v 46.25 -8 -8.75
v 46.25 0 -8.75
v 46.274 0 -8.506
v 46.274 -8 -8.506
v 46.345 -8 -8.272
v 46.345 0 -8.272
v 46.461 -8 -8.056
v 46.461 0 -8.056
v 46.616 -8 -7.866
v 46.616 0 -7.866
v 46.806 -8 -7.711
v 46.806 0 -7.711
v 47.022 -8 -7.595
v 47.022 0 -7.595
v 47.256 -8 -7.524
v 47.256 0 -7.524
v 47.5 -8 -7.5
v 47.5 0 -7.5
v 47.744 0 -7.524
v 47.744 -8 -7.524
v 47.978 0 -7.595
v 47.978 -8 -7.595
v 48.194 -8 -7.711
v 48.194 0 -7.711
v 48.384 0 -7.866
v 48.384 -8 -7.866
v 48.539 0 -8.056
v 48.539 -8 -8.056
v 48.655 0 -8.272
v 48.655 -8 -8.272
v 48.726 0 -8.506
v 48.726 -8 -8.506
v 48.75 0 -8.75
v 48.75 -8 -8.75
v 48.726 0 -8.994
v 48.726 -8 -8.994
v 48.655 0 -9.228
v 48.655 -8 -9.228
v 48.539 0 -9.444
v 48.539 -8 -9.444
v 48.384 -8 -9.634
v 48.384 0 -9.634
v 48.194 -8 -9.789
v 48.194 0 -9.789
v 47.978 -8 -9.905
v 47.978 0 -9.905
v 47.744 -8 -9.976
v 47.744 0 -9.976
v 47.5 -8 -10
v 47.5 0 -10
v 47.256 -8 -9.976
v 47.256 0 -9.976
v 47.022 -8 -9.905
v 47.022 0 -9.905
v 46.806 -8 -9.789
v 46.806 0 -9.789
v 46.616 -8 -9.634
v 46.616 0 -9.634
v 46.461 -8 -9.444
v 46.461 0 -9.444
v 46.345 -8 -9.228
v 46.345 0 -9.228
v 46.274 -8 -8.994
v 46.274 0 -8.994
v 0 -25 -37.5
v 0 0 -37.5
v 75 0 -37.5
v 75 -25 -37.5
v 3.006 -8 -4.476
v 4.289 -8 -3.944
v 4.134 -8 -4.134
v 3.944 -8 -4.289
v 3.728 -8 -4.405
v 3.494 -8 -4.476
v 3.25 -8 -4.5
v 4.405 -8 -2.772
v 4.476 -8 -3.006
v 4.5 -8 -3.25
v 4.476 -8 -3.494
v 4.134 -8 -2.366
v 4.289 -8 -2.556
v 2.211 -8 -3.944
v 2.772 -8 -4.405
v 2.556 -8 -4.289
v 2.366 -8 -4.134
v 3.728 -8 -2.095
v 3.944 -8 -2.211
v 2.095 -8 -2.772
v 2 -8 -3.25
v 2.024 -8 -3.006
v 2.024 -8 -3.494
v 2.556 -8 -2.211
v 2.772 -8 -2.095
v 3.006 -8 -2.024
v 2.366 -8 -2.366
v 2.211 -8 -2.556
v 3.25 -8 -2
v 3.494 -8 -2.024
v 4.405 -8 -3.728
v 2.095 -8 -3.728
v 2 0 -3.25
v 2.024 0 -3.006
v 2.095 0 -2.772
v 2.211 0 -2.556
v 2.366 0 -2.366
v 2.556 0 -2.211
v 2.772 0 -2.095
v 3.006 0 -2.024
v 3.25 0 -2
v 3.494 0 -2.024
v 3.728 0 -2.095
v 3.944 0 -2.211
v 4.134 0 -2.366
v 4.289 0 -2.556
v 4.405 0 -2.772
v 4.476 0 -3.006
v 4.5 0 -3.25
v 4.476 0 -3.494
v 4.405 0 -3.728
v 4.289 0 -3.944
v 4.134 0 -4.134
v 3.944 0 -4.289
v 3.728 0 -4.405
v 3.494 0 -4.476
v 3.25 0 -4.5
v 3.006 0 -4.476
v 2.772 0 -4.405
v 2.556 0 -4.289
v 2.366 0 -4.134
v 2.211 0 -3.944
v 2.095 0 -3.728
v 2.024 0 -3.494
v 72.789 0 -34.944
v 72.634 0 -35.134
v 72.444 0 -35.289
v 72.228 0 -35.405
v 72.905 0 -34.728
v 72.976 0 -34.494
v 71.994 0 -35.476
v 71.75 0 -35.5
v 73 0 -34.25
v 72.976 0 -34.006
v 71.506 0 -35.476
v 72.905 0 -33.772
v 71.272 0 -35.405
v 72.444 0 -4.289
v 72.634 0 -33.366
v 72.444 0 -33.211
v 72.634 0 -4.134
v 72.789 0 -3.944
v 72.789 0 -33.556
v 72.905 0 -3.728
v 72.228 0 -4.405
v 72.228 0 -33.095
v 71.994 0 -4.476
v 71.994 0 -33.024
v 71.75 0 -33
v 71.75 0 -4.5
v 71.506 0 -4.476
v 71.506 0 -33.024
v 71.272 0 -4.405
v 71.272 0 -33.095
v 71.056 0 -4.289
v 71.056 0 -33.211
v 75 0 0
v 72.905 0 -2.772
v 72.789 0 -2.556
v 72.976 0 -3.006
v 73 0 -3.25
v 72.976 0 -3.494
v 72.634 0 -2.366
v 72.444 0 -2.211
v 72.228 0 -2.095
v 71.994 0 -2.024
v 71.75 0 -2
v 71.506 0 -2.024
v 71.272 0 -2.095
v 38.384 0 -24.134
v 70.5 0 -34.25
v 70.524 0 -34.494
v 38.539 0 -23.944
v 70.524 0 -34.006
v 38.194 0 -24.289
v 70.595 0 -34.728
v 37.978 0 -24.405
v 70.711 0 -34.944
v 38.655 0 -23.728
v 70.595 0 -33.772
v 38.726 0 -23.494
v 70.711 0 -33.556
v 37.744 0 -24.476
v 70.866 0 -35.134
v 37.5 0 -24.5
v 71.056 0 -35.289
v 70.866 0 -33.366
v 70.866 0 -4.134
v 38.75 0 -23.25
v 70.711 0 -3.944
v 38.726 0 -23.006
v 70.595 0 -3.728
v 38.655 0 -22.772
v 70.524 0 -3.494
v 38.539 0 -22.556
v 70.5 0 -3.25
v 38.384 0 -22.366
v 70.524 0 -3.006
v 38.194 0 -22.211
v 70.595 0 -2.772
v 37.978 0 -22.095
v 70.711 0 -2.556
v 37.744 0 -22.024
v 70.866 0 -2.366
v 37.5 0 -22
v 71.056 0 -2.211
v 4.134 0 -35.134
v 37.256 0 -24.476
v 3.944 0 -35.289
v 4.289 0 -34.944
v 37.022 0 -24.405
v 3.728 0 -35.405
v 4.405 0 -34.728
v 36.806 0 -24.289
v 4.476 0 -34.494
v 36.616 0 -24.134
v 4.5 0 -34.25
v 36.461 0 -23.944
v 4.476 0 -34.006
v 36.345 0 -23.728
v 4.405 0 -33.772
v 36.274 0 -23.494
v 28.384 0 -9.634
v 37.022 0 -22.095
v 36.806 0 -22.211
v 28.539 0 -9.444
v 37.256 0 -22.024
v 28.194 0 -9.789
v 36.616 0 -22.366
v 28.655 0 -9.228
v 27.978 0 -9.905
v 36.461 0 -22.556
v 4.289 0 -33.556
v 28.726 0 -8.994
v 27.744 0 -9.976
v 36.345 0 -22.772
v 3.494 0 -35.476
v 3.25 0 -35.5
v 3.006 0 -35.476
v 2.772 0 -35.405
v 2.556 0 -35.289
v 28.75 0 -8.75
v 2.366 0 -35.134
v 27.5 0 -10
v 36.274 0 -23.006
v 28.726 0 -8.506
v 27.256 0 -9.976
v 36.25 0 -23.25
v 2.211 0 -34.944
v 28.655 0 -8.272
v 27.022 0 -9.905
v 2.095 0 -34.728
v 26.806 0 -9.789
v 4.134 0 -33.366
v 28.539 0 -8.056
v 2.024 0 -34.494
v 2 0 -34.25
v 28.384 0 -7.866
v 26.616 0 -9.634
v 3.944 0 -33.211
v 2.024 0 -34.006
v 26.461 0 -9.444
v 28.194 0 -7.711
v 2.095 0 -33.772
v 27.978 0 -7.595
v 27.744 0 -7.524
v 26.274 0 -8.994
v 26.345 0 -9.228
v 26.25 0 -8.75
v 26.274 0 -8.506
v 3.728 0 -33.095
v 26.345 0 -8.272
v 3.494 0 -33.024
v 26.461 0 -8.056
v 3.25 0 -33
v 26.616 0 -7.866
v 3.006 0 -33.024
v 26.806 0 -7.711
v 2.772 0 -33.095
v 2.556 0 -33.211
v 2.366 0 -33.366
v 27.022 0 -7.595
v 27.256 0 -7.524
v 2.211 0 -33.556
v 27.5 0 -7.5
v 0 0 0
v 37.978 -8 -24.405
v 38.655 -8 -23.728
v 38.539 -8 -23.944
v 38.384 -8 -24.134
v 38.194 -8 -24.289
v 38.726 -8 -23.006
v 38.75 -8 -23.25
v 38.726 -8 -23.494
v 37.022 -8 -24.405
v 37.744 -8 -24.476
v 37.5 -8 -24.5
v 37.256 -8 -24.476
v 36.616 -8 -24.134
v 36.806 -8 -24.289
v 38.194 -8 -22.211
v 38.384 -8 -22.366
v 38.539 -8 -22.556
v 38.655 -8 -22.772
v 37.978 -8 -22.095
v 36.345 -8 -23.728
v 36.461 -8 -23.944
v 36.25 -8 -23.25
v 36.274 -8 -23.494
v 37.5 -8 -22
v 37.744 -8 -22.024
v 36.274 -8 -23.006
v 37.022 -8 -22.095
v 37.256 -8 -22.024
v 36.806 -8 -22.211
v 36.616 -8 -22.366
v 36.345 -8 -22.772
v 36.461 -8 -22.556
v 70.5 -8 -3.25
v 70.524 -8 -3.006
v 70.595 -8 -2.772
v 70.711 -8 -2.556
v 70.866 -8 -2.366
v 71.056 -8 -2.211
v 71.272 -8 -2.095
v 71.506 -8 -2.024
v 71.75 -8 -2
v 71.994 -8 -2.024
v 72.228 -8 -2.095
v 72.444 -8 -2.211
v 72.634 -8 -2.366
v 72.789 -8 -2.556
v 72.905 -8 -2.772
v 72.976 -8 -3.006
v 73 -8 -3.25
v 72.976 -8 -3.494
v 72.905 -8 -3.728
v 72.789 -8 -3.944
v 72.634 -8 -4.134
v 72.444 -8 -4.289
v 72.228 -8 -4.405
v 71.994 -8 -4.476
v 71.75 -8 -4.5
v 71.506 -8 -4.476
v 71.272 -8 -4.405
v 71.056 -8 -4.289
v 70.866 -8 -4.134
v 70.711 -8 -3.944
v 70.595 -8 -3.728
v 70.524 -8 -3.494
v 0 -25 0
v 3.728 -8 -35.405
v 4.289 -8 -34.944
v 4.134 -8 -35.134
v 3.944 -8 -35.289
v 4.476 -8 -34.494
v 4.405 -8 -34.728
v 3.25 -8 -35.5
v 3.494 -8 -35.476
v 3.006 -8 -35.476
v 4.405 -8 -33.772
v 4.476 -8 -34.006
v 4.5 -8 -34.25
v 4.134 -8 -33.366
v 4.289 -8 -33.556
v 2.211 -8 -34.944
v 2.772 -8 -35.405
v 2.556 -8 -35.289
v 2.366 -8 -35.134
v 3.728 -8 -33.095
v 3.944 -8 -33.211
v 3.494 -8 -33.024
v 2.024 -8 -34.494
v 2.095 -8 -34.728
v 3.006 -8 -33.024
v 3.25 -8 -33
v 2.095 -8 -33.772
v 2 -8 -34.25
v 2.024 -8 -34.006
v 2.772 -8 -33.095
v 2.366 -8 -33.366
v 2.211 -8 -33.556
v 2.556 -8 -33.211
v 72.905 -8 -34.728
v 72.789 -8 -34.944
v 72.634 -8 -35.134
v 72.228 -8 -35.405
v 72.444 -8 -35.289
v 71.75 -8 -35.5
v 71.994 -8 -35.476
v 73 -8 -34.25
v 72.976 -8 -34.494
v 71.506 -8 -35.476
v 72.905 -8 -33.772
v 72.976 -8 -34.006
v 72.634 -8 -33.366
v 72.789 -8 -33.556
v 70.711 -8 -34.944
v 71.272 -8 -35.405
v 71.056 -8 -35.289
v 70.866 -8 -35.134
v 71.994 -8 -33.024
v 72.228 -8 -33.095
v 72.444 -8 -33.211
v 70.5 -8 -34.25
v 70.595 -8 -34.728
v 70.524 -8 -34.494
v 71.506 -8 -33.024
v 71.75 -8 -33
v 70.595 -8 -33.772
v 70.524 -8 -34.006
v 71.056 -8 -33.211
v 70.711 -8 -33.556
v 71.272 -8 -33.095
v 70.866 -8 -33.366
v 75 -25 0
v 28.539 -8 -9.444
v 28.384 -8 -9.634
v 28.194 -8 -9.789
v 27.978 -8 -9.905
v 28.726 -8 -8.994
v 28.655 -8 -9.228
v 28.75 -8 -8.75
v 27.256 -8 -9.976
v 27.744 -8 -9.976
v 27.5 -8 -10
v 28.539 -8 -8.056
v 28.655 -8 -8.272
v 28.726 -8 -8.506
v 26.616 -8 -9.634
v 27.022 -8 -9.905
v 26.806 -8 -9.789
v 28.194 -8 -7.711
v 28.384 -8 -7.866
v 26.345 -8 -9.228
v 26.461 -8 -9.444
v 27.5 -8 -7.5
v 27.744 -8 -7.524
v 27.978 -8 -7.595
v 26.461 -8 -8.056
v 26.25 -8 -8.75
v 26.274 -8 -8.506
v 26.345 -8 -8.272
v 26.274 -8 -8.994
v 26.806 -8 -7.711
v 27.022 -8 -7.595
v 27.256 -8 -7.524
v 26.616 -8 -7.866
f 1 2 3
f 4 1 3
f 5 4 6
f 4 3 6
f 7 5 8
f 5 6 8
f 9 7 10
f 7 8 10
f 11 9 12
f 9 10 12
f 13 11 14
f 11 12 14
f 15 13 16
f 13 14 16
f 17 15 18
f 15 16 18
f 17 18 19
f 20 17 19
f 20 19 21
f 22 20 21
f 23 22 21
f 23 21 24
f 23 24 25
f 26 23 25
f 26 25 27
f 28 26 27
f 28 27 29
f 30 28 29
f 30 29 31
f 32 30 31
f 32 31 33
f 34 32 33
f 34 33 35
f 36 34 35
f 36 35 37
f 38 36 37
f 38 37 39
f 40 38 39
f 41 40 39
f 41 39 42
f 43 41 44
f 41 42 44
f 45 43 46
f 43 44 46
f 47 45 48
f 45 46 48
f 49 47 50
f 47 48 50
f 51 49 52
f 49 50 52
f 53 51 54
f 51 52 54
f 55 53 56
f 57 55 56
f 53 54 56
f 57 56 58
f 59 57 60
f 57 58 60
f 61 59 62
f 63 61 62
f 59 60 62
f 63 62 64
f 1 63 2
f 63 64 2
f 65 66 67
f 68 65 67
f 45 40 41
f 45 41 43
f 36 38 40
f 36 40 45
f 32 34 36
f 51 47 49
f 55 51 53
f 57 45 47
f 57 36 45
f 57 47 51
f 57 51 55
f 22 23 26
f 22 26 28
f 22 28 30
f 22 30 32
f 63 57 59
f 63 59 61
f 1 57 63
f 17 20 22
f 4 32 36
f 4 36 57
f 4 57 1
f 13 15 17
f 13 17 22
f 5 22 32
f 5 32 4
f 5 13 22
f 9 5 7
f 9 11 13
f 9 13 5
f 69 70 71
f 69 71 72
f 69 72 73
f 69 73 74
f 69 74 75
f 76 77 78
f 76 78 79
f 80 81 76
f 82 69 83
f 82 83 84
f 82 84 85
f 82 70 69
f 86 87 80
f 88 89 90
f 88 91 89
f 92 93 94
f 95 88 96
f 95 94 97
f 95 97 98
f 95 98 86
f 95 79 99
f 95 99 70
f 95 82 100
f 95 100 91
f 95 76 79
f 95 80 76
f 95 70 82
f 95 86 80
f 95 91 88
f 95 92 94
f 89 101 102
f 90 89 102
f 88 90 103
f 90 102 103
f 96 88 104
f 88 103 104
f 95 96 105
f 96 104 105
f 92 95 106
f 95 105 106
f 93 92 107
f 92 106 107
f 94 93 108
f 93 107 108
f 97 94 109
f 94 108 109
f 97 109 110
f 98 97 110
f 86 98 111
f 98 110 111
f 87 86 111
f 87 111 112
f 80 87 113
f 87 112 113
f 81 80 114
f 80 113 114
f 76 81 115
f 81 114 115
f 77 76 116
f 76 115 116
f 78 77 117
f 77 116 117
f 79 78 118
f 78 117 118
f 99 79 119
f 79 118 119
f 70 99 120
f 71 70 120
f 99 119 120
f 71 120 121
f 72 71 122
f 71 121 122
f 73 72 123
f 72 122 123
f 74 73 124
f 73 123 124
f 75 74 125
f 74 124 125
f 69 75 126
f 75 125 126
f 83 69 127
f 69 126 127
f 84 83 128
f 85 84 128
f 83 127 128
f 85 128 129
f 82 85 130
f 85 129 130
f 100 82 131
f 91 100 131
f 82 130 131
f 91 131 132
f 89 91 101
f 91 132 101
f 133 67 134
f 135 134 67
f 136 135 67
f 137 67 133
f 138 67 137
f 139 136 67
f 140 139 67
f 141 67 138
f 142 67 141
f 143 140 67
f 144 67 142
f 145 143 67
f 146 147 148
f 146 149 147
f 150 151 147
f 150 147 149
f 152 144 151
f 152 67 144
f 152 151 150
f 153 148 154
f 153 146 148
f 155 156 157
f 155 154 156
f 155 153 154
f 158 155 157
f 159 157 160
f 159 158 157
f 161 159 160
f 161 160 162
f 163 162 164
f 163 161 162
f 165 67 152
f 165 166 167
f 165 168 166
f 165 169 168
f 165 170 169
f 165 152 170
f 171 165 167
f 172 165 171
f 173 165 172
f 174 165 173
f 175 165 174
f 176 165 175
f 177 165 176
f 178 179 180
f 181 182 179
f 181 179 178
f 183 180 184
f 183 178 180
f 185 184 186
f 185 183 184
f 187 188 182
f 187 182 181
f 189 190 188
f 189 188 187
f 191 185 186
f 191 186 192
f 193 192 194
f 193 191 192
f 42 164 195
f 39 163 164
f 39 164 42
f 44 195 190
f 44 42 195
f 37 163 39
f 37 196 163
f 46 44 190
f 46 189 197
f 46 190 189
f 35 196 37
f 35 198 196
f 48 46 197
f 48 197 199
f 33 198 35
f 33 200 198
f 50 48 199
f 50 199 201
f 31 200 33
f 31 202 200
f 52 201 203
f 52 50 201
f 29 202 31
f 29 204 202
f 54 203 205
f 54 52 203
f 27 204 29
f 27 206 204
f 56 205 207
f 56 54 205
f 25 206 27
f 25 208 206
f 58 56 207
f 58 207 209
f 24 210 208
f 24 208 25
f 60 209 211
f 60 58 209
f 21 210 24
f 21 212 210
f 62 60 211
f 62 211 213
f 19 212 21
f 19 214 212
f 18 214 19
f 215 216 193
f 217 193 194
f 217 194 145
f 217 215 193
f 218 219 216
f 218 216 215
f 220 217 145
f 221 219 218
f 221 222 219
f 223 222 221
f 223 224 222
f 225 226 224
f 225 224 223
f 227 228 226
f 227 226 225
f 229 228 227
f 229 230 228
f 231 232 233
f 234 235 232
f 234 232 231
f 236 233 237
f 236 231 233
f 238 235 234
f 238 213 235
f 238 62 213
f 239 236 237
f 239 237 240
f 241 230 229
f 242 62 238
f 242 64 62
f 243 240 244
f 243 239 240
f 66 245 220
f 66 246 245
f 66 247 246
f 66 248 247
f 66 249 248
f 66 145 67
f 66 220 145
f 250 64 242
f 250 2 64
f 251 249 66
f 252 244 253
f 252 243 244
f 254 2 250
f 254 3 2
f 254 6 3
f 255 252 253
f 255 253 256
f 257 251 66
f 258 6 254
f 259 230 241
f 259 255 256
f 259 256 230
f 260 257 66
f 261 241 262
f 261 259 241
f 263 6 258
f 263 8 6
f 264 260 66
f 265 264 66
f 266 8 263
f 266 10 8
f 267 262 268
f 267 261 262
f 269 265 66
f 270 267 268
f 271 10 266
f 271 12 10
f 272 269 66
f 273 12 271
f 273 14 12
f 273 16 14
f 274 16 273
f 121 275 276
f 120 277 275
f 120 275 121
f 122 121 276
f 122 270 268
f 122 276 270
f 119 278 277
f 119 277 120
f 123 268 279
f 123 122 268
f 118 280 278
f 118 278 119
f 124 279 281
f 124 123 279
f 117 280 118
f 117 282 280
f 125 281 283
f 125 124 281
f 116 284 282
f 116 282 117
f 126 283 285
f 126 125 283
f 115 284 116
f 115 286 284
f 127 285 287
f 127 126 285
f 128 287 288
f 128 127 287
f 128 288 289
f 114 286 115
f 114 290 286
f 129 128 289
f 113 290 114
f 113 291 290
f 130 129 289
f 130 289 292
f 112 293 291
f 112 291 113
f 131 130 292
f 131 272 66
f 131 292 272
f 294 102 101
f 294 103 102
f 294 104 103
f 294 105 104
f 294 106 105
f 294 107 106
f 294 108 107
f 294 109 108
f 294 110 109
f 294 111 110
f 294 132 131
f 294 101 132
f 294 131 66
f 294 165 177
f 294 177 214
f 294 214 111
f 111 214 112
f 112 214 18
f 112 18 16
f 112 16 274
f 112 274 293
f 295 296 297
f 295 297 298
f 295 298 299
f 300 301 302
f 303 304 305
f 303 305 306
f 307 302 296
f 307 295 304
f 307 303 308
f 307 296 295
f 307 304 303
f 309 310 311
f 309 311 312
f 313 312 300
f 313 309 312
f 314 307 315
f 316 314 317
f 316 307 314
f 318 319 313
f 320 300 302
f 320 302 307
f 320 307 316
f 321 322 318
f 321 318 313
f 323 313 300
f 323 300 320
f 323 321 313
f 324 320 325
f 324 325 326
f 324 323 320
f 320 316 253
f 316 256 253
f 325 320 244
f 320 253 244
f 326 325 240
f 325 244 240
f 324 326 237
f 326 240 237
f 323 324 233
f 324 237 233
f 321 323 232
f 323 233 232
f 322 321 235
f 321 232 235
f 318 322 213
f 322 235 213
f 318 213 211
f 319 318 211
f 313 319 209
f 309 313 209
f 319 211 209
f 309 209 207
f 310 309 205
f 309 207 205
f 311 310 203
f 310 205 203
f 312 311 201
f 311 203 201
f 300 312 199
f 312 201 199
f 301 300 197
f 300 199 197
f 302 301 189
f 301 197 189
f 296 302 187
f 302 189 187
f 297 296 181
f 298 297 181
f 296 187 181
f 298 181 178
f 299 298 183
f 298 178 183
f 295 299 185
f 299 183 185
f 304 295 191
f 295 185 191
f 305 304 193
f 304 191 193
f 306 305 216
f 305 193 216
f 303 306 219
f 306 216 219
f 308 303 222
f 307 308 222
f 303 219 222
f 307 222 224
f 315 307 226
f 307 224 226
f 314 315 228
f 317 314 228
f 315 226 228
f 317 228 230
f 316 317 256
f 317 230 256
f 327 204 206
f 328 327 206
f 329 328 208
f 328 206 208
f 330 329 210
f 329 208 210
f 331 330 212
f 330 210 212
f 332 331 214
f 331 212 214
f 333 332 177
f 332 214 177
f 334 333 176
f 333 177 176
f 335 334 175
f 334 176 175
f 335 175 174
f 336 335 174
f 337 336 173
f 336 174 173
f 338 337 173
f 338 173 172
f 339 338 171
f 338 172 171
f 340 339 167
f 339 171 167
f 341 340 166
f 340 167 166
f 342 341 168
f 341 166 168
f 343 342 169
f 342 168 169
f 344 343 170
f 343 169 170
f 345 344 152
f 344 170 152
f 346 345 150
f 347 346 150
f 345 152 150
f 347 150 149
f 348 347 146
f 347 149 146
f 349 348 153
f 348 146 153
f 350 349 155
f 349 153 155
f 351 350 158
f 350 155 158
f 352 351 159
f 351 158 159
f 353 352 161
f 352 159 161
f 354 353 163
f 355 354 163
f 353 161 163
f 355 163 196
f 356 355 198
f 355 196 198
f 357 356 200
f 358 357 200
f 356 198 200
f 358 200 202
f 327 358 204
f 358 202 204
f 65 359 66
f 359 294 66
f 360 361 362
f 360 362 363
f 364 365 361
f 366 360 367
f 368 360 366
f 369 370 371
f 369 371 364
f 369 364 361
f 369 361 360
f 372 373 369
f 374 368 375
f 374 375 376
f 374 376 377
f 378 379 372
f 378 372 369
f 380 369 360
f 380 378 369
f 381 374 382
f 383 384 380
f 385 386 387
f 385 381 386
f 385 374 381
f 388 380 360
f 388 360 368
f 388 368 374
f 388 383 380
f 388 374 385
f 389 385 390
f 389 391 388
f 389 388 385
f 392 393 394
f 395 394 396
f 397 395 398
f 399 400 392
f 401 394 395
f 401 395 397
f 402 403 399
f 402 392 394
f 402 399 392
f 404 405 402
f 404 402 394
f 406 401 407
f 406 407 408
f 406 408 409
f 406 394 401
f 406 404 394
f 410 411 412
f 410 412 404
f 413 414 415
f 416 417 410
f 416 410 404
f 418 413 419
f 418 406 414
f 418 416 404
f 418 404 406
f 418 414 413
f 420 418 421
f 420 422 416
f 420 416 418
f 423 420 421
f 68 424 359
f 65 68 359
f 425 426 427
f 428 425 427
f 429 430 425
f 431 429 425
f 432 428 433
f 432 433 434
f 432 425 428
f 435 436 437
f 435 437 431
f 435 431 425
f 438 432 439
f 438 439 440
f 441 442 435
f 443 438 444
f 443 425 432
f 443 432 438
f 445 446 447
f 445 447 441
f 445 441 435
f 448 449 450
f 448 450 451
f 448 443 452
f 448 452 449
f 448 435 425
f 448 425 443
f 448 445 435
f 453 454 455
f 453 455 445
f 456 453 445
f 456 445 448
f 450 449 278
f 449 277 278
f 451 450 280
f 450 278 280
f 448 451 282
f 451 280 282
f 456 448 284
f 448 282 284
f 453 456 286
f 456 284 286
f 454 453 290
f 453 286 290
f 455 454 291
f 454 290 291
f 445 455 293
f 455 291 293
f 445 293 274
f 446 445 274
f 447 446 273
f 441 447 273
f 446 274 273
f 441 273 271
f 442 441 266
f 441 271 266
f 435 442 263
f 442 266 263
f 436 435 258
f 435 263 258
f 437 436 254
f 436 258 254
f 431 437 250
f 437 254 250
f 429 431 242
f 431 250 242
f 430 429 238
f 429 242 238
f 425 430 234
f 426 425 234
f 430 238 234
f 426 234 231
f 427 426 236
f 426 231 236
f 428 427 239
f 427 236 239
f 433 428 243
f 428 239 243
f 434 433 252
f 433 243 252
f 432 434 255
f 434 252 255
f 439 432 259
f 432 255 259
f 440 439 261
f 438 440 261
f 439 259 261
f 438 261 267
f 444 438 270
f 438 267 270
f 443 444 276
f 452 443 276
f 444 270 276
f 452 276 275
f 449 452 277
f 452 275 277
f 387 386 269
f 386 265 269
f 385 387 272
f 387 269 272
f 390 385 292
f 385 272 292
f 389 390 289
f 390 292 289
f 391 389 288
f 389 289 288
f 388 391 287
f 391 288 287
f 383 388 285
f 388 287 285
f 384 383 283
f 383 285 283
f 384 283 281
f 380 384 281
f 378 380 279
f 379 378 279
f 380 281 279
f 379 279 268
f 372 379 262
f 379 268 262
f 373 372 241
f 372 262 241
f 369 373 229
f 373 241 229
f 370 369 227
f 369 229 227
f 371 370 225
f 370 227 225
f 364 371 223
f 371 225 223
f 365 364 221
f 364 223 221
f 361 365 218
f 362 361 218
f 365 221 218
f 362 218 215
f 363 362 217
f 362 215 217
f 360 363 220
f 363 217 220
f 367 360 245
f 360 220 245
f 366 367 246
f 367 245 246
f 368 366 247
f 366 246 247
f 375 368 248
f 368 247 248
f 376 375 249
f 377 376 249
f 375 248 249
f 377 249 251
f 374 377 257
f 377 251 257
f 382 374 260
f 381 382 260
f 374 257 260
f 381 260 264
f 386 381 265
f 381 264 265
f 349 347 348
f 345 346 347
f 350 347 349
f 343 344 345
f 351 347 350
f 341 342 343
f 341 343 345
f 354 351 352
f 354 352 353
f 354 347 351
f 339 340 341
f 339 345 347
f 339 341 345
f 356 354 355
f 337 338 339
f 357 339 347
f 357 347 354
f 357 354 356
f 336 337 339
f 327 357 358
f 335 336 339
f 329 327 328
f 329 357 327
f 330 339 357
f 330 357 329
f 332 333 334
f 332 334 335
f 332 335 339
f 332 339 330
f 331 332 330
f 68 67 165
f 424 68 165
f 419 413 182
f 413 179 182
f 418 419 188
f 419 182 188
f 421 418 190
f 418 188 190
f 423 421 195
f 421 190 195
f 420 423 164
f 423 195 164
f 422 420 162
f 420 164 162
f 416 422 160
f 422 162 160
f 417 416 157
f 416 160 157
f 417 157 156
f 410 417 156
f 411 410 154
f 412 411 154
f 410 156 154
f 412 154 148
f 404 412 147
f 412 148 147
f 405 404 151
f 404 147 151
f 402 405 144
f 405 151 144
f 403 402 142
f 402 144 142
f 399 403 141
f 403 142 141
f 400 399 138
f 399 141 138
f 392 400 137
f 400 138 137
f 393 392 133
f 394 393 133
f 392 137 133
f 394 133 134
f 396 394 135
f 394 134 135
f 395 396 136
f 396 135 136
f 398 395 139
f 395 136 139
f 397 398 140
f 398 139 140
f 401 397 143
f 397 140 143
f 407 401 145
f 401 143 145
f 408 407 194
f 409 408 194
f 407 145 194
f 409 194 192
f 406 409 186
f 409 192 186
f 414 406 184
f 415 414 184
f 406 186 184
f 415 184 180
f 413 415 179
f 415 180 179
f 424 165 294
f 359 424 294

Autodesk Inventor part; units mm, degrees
ref_plane "YZ Plane" through (0, 0, 0) normal (1, 0, 0) x (0, 1, 0)
ref_plane "XZ Plane" through (0, 0, 0) normal (0, 1, 0) x (-1, 0, 0)
ref_plane "XY Plane" through (0, 0, 0) normal (0, 0, 1) x (1, 0, 0)
sketch "Sketch1" plane through (0, 0, 0) normal (0, 1, 0) x (-1, 0, 0)
  line L0 (0, -37.5) -> (-75, -37.5)
  line L1 (-75, -37.5) -> (-75, 0)
  line L2 (-75, 0) -> (0, 0)
  line L3 (0, 0) -> (0, -37.5)
  line L4 (-3.25, -34.25) -> (-71.75, -34.25) construction
  line L5 (-71.75, -34.25) -> (-71.75, -3.25) construction
  line L6 (-71.75, -3.25) -> (-3.25, -3.25) construction
  line L7 (-3.25, -3.25) -> (-3.25, -34.25) construction
  circle A0 centre (-3.25, -34.25) radius 1.25
  circle A1 centre (-37.5, -23.25) radius 1.25
  circle A2 centre (-3.25, -3.25) radius 1.25
  circle A3 centre (-71.75, -3.25) radius 1.25
  circle A4 centre (-71.75, -34.25) radius 1.25
  circle A5 centre (-47.5, -8.75) radius 1.25
  circle A6 centre (-27.5, -8.75) radius 1.25
  line L8 (-27.5, -8.75) -> (-47.5, -8.75) construction
  point P0 (-37.5, -34.25)
  point P1 (-37.5, -37.5)
  point P2 (-3.25, -18.75)
  point P3 (0, -18.75)
  point P4 (-37.5, -8.75)
  point P5 (-37.5, -3.25)
  dimension "d0" = 37.5
  dimension "d1" = 75
  dimension "d2" = 31
  dimension "d3" = 68.5
  dimension "d4" = 2.5
  dimension "d6" = 2.5
  dimension "d7" = 2.5
  dimension "d8" = 2.5
  dimension "d9" = 2.5
  dimension "d10" = 34.25
  dimension "d11" = 11
  dimension "d16" = 2.5
  dimension "d17" = 2.5
  dimension "d18" = 20
  dimension "d19" = 10
extrude "Extrusion1" add sketch "Sketch1" against normal blind 25 contours L0 L1 L2 L3 | A0 | A1 | A2 | A3 | A4 | A5 | A6
extrude "Extrusion2" cut sketch "Sketch1" against normal blind 8 contours A0 | A1 | A2 | A3 | A4 | A5 | A6
properties part number "heatsink-dual-CNC_3DPrint"
